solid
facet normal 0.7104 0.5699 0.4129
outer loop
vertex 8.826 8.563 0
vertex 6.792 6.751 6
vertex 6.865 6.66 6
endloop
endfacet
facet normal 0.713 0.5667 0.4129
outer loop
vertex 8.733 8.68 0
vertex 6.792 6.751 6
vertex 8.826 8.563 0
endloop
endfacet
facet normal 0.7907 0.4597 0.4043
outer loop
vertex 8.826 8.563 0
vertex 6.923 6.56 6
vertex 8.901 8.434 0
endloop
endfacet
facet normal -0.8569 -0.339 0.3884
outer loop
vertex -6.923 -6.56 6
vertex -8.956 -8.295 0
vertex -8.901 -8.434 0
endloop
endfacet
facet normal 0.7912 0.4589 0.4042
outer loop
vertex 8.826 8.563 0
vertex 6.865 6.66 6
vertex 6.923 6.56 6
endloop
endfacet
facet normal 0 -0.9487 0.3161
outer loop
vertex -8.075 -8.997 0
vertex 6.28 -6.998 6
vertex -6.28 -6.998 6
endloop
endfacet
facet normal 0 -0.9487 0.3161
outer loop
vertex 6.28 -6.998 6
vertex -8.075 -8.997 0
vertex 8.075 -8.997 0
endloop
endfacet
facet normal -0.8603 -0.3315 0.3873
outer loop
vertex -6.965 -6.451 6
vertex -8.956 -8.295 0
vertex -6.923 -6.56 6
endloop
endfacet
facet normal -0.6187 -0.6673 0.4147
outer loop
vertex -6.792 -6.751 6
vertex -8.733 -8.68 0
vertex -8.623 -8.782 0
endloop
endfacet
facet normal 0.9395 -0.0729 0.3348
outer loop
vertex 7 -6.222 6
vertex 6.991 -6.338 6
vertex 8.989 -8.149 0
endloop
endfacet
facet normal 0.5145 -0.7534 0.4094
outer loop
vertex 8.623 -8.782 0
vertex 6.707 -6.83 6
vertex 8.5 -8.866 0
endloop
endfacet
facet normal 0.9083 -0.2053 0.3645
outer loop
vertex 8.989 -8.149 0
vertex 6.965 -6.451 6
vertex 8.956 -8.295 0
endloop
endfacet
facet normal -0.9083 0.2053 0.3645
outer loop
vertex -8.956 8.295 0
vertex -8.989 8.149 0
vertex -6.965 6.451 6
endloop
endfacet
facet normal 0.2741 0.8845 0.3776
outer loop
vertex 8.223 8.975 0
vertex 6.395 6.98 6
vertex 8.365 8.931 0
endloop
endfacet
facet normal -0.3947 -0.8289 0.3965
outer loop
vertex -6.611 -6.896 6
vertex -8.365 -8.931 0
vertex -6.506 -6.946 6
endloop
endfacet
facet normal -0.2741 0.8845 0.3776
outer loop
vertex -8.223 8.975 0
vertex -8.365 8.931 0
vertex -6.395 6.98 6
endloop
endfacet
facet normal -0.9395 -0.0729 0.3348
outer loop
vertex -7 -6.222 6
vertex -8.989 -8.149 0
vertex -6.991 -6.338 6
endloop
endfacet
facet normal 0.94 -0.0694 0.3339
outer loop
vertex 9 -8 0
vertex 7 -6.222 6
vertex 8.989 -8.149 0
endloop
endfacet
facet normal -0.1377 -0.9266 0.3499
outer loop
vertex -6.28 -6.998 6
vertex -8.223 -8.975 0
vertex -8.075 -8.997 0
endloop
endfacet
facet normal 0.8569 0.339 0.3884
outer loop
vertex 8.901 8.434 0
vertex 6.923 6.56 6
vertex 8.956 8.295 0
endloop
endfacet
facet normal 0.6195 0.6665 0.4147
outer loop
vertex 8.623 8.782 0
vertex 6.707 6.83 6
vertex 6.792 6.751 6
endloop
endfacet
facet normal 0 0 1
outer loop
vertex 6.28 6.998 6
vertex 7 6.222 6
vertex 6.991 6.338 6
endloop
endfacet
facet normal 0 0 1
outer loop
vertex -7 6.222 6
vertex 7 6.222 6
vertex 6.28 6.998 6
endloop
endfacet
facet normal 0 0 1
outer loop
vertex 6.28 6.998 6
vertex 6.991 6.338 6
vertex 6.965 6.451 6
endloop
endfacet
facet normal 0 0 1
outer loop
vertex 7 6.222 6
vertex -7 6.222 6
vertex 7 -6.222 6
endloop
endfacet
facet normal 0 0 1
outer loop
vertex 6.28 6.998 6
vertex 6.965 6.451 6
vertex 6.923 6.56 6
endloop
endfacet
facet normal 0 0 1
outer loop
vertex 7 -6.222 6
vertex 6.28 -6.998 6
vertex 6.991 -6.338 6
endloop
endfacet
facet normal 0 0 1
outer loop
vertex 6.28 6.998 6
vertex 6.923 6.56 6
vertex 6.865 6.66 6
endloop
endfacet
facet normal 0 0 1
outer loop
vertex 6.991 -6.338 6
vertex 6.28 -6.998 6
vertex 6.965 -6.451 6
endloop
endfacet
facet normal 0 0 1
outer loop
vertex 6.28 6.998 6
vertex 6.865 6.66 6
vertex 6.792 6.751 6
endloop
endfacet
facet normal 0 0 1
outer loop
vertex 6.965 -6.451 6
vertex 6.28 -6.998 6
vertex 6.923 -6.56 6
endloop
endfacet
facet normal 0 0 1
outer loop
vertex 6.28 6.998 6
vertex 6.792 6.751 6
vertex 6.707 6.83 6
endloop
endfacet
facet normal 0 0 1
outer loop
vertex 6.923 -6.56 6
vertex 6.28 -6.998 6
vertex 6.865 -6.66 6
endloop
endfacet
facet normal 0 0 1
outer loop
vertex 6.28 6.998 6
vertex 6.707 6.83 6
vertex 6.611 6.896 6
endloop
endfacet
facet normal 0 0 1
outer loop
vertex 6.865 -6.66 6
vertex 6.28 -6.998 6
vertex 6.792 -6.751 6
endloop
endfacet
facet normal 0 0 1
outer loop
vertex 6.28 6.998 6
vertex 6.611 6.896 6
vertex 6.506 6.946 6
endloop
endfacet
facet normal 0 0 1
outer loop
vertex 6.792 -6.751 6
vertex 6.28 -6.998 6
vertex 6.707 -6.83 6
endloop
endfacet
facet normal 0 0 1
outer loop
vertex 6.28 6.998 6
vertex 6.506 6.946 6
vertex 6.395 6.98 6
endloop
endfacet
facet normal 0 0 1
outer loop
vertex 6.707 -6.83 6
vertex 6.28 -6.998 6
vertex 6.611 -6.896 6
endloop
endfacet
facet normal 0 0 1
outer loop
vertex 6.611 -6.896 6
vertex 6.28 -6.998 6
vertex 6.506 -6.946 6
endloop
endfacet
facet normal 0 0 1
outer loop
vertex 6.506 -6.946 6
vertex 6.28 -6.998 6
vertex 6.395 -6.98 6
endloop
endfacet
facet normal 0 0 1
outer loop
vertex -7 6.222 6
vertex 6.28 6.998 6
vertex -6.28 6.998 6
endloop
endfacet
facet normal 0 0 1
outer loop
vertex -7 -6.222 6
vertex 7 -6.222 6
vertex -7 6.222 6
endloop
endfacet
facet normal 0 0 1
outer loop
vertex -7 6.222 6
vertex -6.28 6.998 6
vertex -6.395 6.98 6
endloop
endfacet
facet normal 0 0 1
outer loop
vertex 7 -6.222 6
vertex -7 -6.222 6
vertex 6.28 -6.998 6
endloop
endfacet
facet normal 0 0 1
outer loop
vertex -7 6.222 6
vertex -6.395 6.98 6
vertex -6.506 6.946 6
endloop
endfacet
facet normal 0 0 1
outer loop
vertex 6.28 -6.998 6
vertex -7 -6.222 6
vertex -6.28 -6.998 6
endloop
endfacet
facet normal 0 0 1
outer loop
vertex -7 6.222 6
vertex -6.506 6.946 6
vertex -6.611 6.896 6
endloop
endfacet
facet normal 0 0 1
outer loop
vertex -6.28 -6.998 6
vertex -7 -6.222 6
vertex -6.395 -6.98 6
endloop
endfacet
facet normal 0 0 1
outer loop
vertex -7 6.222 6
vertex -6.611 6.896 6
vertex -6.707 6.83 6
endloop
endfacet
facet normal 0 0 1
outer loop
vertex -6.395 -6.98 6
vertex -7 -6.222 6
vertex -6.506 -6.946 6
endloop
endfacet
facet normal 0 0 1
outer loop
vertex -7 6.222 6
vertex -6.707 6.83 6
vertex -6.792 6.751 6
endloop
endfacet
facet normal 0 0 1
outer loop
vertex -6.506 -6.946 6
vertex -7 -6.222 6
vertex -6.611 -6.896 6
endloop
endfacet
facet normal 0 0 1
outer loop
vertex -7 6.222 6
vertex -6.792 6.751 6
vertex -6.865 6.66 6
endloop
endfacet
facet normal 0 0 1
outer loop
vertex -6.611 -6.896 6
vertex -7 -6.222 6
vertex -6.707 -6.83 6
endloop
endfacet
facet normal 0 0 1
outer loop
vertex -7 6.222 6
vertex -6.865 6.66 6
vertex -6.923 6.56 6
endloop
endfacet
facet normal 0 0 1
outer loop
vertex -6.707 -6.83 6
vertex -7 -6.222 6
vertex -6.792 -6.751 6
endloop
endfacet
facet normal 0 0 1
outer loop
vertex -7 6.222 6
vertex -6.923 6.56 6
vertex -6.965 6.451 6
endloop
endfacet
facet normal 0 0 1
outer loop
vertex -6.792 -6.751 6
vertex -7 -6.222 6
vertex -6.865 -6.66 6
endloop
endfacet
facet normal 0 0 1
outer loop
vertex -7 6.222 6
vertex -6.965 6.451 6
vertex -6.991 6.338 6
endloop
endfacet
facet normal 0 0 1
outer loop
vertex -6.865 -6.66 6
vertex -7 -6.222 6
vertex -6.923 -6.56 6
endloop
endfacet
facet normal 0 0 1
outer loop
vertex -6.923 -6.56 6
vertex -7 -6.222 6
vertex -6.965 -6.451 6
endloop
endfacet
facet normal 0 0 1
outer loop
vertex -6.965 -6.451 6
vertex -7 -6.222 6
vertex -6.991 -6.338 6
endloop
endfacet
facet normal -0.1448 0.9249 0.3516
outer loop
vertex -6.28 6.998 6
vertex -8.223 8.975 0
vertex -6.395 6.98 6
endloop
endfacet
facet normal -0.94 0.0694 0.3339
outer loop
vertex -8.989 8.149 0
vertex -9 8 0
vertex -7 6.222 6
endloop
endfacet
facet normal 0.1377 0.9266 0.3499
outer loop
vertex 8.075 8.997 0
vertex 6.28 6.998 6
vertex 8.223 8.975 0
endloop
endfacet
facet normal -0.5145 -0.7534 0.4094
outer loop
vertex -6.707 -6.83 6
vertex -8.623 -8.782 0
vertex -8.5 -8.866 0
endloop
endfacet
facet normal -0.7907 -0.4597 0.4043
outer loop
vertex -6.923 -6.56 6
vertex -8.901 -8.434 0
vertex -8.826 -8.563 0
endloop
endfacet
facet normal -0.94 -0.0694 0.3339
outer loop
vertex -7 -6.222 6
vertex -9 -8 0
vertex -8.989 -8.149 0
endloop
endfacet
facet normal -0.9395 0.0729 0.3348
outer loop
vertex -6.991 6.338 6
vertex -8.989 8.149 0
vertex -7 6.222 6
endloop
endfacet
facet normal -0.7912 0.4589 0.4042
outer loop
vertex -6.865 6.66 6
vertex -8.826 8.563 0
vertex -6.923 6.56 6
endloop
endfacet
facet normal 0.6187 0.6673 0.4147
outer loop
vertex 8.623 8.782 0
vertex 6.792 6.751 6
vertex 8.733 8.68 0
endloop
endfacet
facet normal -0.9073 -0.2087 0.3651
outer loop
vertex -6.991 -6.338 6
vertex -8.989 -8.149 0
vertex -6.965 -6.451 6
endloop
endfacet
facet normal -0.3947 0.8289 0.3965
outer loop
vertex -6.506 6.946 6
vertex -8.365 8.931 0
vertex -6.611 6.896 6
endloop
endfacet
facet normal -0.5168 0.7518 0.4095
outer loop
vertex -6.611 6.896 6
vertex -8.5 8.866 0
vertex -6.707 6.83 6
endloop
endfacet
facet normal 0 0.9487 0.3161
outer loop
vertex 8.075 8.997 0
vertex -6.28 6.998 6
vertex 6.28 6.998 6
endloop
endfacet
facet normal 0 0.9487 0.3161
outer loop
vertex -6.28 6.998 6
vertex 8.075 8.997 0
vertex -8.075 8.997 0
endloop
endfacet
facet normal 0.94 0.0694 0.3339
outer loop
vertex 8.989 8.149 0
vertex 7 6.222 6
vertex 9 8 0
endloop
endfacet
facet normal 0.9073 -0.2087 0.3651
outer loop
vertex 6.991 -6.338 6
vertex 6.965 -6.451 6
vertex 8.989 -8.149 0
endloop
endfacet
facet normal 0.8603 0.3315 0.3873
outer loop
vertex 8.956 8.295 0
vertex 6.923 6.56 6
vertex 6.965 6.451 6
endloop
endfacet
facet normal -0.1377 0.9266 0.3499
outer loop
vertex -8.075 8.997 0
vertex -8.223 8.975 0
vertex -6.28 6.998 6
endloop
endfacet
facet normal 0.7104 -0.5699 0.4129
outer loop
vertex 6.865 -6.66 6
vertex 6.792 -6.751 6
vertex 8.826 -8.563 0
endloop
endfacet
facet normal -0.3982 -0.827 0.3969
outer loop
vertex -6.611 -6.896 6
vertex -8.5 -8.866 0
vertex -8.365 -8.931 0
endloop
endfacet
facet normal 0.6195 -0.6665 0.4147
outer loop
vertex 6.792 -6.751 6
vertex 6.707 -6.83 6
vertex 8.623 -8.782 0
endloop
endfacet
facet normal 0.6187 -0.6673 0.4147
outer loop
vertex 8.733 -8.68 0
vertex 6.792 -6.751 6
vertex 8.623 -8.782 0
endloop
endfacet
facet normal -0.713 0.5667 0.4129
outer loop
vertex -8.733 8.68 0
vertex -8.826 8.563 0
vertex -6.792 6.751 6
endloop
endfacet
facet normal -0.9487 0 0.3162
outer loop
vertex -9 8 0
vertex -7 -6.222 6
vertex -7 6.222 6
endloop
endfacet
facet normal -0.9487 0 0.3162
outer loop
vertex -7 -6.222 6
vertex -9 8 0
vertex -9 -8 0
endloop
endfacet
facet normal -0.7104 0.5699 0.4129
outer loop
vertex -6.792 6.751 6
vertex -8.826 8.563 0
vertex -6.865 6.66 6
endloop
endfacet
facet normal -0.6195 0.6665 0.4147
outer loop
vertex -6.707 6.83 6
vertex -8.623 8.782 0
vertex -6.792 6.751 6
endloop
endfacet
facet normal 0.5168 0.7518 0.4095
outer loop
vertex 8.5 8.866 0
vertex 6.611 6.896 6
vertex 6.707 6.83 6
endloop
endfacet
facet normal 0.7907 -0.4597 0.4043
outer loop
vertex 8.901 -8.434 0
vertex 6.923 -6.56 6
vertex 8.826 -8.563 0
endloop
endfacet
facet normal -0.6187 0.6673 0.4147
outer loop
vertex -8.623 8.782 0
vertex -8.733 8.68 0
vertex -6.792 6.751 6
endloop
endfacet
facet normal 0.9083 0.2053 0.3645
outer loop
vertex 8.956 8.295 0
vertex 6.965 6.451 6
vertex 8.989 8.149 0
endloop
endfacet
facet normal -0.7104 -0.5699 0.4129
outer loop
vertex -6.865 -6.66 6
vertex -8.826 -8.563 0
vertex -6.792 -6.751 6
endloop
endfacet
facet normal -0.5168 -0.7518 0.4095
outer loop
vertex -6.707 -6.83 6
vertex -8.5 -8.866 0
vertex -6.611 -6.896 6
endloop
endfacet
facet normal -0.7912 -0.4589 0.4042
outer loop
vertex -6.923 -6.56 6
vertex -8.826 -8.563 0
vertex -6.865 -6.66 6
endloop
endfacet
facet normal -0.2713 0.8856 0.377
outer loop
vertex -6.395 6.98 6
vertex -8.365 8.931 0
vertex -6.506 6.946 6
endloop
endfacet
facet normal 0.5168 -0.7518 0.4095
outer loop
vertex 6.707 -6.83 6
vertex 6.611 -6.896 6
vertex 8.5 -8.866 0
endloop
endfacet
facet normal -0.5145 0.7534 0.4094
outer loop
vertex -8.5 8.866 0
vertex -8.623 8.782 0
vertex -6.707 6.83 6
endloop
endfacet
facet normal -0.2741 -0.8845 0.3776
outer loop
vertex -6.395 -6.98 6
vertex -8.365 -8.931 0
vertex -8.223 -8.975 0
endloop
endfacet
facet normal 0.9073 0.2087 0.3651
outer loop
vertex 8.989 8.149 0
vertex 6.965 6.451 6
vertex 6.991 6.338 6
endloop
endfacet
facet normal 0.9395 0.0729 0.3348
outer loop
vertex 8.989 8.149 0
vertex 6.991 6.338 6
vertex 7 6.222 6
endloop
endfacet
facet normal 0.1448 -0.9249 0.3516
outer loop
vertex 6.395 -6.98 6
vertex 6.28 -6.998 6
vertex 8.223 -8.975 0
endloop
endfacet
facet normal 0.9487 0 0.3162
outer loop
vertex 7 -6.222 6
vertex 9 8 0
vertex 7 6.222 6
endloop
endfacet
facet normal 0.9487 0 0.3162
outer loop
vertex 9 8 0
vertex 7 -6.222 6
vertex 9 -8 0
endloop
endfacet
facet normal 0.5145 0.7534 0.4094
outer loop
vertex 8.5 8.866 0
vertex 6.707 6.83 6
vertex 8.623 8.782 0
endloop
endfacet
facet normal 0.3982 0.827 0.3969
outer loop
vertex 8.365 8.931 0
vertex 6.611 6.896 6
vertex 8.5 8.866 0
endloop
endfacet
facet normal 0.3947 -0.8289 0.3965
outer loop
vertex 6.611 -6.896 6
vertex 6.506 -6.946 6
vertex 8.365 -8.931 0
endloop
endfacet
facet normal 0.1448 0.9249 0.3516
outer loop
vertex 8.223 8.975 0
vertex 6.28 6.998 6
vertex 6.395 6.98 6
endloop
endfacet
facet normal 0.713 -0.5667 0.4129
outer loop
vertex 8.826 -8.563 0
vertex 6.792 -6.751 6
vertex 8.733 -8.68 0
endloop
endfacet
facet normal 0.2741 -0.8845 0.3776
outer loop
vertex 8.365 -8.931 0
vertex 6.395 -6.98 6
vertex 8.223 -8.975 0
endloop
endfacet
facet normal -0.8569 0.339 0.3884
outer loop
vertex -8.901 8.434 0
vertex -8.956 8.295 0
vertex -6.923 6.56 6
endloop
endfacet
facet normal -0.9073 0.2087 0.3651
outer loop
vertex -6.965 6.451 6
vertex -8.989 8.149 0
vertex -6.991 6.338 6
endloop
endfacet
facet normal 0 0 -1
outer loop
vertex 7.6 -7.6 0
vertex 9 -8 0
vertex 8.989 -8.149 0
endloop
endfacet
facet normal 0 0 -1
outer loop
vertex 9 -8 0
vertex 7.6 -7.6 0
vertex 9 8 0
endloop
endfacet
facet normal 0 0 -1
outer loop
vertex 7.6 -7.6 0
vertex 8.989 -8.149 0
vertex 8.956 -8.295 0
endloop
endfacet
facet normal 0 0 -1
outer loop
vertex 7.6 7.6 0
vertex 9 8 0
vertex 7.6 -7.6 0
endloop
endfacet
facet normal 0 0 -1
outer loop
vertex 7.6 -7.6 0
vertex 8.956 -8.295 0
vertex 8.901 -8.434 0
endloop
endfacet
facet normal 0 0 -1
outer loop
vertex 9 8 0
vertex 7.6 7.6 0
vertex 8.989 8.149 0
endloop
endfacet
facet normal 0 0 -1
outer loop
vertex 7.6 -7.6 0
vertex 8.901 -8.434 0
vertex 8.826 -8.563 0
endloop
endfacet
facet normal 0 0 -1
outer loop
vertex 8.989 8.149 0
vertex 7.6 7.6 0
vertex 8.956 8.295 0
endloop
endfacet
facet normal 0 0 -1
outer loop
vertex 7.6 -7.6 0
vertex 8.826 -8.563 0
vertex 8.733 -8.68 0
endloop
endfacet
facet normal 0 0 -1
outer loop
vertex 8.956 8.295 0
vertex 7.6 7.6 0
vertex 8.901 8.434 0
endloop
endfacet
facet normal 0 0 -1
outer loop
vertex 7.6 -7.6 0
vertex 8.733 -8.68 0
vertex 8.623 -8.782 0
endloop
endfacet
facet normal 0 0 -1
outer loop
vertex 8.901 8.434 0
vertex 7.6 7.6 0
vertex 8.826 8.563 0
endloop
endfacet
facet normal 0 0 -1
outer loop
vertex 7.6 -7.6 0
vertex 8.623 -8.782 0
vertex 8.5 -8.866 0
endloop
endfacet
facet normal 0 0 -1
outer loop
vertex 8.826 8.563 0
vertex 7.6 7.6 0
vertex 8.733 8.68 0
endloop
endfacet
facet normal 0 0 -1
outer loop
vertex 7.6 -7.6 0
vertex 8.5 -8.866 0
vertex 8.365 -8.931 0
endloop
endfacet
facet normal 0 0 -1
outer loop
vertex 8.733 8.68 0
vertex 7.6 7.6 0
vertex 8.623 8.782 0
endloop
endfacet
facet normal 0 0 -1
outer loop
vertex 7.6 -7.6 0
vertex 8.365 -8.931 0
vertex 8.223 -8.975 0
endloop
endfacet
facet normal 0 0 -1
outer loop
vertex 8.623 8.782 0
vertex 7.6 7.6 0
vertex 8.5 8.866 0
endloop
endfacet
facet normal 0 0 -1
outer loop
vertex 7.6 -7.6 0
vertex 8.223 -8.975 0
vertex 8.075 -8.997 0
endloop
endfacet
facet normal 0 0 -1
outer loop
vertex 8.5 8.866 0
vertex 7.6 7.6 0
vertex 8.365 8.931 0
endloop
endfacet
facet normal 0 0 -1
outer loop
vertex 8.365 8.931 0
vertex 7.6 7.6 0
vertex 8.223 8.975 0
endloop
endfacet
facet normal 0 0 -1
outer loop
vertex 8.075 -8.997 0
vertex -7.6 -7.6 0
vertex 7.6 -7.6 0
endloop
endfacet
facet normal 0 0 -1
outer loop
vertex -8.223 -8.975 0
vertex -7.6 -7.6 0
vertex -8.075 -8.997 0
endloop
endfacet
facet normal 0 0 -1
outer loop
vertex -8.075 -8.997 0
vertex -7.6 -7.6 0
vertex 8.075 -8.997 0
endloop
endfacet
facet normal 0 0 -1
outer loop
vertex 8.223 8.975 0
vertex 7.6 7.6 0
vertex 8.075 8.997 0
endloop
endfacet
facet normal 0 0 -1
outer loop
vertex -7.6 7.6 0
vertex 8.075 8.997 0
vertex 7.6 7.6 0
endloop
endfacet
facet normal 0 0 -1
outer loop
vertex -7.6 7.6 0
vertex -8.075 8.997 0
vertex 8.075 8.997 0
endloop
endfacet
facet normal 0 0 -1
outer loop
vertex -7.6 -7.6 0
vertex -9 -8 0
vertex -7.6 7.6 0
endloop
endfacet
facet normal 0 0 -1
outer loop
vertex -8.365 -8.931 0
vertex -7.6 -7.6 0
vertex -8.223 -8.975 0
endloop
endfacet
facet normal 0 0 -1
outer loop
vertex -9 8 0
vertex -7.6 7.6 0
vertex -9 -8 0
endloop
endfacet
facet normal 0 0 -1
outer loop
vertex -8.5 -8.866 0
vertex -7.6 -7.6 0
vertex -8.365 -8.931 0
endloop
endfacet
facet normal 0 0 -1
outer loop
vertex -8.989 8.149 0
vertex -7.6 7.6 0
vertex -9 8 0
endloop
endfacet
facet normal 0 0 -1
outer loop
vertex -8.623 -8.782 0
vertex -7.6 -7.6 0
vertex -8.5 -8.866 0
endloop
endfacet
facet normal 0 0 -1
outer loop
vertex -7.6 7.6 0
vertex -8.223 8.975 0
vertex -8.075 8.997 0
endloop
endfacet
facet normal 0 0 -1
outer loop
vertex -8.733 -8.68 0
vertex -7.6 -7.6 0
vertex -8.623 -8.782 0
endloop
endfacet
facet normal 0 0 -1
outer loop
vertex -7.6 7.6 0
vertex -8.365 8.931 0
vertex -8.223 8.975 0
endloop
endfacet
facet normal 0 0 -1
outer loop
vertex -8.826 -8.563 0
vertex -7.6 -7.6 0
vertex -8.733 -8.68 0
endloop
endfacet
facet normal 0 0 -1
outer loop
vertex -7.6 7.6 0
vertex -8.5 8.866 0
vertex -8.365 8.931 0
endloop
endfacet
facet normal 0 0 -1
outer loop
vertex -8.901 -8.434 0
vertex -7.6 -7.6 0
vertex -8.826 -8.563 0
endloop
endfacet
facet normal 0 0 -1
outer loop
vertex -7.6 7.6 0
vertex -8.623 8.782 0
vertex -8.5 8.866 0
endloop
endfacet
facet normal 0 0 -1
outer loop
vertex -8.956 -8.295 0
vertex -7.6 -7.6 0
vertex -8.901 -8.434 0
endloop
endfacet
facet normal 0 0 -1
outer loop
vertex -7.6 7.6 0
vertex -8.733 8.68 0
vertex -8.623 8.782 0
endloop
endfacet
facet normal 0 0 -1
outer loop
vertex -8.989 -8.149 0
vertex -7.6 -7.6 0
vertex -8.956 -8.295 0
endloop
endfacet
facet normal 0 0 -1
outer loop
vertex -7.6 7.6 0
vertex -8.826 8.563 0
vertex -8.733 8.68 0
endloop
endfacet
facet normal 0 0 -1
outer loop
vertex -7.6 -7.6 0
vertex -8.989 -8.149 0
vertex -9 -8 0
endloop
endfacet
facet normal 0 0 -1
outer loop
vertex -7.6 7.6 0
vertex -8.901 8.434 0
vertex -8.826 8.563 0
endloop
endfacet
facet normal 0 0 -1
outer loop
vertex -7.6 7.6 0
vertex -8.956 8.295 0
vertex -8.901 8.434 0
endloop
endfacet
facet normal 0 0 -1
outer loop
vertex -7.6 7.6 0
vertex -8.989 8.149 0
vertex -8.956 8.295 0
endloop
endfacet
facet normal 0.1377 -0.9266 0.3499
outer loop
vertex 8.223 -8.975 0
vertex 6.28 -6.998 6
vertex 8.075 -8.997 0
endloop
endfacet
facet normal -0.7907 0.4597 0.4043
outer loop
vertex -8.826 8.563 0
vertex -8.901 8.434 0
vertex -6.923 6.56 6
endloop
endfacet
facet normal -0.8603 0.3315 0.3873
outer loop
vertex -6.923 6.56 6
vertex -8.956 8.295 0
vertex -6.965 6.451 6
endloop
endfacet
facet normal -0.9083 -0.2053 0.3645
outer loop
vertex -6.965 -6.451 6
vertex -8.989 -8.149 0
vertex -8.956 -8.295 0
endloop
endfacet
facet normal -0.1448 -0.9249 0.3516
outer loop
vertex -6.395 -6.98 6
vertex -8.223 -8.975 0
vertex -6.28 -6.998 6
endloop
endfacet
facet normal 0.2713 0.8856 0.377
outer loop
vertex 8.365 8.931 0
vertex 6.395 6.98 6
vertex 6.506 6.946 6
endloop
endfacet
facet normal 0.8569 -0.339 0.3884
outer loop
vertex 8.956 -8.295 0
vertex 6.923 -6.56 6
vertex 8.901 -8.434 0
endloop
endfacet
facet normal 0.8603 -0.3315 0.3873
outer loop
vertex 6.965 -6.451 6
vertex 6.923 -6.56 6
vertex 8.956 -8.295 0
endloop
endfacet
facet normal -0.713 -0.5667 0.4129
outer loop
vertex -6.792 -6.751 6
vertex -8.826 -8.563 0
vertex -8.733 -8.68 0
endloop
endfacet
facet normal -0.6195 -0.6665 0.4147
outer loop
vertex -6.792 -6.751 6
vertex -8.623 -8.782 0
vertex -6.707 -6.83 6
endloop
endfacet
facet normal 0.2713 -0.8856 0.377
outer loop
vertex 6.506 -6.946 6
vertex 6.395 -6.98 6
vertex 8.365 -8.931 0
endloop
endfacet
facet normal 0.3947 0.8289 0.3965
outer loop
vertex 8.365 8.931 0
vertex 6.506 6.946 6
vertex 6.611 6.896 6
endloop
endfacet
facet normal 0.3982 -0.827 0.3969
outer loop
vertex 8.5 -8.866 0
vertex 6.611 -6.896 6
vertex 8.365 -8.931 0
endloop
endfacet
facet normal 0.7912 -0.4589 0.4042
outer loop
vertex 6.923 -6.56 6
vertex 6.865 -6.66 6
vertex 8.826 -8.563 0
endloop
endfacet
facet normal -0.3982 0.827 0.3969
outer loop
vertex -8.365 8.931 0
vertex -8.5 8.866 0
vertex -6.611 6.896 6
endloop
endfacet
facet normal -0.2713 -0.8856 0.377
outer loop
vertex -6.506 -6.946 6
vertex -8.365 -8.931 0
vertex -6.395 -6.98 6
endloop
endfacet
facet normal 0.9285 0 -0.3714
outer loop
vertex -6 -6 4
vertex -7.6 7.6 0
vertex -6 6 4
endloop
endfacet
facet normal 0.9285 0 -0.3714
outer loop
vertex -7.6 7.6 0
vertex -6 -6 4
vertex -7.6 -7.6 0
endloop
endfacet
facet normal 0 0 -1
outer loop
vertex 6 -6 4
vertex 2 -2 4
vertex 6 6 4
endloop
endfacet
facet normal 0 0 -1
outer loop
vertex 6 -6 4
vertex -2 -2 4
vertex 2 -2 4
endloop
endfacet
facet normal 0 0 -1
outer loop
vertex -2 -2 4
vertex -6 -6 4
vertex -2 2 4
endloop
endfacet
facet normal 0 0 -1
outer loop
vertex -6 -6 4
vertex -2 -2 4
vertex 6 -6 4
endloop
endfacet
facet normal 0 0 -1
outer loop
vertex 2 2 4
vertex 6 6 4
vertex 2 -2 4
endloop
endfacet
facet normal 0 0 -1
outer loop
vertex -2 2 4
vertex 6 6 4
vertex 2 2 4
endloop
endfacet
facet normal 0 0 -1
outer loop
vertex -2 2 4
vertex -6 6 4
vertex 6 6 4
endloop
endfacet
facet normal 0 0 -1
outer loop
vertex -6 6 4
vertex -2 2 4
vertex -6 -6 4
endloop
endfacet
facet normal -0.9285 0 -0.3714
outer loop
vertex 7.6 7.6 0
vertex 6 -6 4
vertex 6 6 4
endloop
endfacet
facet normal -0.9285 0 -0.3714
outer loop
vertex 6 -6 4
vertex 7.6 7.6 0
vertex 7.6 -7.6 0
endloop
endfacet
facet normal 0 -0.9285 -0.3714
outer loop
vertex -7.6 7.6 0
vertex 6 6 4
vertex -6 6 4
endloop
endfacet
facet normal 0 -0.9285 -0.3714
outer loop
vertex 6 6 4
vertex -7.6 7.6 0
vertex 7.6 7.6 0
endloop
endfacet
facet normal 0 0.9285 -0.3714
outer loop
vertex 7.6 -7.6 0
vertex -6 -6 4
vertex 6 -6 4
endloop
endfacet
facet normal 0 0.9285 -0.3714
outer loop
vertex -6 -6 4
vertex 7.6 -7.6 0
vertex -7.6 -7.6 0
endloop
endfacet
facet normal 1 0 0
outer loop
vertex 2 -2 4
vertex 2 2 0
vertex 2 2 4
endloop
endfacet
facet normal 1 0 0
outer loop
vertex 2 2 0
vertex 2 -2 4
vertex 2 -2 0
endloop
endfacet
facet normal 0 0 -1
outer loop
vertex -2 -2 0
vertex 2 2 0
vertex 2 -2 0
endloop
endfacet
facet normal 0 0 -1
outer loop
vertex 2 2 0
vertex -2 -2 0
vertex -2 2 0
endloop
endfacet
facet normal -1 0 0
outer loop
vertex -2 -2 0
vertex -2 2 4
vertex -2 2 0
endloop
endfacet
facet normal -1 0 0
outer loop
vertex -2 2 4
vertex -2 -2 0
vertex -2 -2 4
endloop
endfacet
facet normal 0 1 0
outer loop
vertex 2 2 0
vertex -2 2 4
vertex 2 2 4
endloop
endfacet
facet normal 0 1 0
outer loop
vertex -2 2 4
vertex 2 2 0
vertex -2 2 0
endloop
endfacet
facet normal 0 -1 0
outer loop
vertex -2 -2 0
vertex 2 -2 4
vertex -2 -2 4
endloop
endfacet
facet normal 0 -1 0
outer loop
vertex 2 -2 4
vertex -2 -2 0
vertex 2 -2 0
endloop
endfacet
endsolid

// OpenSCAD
// file: utils/rounded_square.scad
module rounded_square( width, radius_corner, center = false ) {
    translate = (center == false) ?
		[radius_corner, radius_corner, 0] :
		[radius_corner - width / 2, radius_corner - width / 2, 0];
    
	translate( v = translate )
		minkowski() {
			square( width - 2 * radius_corner );
			circle( radius_corner );
		}
}
// main file
use <utils/rounded_square.scad>

// Parameters for the keycap
keycap_base_width = 18;      // Base width of the keycap
keycap_top_width = 14;       // Top width of the keycap
keycap_height = 6;           // Height of the keycap
keycap_thickness = 1.0;      // Thickness of the keycap walls
stem_socket_width = 4;       // Width of the stem socket
stem_socket_depth = 5;     // Depth of the stem socket

module keycap() {
    difference() {     
    // Outer keycap shape
    linear_extrude(height = keycap_height, scale = keycap_top_width / keycap_base_width)
        rounded_square(keycap_base_width, 1, true);

    // Inner keycap shape (for hollowing)
    translate([0, 0, -keycap_thickness])
        linear_extrude(height = keycap_height - keycap_thickness, scale = (keycap_top_width - 2 * keycap_thickness) / (keycap_base_width - 2 * keycap_thickness))
            square([keycap_base_width - 2 * keycap_thickness, keycap_base_width - 2 * keycap_thickness], center = true);
        
    }
    
    // Stem socket at the bottom of the keycap
    translate([0, 0, stem_socket_depth/2])
        cube([stem_socket_width, stem_socket_width, stem_socket_depth], center = true);
}

// Render the keycap
keycap();

$fa = 0.5;
$fs = 0.15;
